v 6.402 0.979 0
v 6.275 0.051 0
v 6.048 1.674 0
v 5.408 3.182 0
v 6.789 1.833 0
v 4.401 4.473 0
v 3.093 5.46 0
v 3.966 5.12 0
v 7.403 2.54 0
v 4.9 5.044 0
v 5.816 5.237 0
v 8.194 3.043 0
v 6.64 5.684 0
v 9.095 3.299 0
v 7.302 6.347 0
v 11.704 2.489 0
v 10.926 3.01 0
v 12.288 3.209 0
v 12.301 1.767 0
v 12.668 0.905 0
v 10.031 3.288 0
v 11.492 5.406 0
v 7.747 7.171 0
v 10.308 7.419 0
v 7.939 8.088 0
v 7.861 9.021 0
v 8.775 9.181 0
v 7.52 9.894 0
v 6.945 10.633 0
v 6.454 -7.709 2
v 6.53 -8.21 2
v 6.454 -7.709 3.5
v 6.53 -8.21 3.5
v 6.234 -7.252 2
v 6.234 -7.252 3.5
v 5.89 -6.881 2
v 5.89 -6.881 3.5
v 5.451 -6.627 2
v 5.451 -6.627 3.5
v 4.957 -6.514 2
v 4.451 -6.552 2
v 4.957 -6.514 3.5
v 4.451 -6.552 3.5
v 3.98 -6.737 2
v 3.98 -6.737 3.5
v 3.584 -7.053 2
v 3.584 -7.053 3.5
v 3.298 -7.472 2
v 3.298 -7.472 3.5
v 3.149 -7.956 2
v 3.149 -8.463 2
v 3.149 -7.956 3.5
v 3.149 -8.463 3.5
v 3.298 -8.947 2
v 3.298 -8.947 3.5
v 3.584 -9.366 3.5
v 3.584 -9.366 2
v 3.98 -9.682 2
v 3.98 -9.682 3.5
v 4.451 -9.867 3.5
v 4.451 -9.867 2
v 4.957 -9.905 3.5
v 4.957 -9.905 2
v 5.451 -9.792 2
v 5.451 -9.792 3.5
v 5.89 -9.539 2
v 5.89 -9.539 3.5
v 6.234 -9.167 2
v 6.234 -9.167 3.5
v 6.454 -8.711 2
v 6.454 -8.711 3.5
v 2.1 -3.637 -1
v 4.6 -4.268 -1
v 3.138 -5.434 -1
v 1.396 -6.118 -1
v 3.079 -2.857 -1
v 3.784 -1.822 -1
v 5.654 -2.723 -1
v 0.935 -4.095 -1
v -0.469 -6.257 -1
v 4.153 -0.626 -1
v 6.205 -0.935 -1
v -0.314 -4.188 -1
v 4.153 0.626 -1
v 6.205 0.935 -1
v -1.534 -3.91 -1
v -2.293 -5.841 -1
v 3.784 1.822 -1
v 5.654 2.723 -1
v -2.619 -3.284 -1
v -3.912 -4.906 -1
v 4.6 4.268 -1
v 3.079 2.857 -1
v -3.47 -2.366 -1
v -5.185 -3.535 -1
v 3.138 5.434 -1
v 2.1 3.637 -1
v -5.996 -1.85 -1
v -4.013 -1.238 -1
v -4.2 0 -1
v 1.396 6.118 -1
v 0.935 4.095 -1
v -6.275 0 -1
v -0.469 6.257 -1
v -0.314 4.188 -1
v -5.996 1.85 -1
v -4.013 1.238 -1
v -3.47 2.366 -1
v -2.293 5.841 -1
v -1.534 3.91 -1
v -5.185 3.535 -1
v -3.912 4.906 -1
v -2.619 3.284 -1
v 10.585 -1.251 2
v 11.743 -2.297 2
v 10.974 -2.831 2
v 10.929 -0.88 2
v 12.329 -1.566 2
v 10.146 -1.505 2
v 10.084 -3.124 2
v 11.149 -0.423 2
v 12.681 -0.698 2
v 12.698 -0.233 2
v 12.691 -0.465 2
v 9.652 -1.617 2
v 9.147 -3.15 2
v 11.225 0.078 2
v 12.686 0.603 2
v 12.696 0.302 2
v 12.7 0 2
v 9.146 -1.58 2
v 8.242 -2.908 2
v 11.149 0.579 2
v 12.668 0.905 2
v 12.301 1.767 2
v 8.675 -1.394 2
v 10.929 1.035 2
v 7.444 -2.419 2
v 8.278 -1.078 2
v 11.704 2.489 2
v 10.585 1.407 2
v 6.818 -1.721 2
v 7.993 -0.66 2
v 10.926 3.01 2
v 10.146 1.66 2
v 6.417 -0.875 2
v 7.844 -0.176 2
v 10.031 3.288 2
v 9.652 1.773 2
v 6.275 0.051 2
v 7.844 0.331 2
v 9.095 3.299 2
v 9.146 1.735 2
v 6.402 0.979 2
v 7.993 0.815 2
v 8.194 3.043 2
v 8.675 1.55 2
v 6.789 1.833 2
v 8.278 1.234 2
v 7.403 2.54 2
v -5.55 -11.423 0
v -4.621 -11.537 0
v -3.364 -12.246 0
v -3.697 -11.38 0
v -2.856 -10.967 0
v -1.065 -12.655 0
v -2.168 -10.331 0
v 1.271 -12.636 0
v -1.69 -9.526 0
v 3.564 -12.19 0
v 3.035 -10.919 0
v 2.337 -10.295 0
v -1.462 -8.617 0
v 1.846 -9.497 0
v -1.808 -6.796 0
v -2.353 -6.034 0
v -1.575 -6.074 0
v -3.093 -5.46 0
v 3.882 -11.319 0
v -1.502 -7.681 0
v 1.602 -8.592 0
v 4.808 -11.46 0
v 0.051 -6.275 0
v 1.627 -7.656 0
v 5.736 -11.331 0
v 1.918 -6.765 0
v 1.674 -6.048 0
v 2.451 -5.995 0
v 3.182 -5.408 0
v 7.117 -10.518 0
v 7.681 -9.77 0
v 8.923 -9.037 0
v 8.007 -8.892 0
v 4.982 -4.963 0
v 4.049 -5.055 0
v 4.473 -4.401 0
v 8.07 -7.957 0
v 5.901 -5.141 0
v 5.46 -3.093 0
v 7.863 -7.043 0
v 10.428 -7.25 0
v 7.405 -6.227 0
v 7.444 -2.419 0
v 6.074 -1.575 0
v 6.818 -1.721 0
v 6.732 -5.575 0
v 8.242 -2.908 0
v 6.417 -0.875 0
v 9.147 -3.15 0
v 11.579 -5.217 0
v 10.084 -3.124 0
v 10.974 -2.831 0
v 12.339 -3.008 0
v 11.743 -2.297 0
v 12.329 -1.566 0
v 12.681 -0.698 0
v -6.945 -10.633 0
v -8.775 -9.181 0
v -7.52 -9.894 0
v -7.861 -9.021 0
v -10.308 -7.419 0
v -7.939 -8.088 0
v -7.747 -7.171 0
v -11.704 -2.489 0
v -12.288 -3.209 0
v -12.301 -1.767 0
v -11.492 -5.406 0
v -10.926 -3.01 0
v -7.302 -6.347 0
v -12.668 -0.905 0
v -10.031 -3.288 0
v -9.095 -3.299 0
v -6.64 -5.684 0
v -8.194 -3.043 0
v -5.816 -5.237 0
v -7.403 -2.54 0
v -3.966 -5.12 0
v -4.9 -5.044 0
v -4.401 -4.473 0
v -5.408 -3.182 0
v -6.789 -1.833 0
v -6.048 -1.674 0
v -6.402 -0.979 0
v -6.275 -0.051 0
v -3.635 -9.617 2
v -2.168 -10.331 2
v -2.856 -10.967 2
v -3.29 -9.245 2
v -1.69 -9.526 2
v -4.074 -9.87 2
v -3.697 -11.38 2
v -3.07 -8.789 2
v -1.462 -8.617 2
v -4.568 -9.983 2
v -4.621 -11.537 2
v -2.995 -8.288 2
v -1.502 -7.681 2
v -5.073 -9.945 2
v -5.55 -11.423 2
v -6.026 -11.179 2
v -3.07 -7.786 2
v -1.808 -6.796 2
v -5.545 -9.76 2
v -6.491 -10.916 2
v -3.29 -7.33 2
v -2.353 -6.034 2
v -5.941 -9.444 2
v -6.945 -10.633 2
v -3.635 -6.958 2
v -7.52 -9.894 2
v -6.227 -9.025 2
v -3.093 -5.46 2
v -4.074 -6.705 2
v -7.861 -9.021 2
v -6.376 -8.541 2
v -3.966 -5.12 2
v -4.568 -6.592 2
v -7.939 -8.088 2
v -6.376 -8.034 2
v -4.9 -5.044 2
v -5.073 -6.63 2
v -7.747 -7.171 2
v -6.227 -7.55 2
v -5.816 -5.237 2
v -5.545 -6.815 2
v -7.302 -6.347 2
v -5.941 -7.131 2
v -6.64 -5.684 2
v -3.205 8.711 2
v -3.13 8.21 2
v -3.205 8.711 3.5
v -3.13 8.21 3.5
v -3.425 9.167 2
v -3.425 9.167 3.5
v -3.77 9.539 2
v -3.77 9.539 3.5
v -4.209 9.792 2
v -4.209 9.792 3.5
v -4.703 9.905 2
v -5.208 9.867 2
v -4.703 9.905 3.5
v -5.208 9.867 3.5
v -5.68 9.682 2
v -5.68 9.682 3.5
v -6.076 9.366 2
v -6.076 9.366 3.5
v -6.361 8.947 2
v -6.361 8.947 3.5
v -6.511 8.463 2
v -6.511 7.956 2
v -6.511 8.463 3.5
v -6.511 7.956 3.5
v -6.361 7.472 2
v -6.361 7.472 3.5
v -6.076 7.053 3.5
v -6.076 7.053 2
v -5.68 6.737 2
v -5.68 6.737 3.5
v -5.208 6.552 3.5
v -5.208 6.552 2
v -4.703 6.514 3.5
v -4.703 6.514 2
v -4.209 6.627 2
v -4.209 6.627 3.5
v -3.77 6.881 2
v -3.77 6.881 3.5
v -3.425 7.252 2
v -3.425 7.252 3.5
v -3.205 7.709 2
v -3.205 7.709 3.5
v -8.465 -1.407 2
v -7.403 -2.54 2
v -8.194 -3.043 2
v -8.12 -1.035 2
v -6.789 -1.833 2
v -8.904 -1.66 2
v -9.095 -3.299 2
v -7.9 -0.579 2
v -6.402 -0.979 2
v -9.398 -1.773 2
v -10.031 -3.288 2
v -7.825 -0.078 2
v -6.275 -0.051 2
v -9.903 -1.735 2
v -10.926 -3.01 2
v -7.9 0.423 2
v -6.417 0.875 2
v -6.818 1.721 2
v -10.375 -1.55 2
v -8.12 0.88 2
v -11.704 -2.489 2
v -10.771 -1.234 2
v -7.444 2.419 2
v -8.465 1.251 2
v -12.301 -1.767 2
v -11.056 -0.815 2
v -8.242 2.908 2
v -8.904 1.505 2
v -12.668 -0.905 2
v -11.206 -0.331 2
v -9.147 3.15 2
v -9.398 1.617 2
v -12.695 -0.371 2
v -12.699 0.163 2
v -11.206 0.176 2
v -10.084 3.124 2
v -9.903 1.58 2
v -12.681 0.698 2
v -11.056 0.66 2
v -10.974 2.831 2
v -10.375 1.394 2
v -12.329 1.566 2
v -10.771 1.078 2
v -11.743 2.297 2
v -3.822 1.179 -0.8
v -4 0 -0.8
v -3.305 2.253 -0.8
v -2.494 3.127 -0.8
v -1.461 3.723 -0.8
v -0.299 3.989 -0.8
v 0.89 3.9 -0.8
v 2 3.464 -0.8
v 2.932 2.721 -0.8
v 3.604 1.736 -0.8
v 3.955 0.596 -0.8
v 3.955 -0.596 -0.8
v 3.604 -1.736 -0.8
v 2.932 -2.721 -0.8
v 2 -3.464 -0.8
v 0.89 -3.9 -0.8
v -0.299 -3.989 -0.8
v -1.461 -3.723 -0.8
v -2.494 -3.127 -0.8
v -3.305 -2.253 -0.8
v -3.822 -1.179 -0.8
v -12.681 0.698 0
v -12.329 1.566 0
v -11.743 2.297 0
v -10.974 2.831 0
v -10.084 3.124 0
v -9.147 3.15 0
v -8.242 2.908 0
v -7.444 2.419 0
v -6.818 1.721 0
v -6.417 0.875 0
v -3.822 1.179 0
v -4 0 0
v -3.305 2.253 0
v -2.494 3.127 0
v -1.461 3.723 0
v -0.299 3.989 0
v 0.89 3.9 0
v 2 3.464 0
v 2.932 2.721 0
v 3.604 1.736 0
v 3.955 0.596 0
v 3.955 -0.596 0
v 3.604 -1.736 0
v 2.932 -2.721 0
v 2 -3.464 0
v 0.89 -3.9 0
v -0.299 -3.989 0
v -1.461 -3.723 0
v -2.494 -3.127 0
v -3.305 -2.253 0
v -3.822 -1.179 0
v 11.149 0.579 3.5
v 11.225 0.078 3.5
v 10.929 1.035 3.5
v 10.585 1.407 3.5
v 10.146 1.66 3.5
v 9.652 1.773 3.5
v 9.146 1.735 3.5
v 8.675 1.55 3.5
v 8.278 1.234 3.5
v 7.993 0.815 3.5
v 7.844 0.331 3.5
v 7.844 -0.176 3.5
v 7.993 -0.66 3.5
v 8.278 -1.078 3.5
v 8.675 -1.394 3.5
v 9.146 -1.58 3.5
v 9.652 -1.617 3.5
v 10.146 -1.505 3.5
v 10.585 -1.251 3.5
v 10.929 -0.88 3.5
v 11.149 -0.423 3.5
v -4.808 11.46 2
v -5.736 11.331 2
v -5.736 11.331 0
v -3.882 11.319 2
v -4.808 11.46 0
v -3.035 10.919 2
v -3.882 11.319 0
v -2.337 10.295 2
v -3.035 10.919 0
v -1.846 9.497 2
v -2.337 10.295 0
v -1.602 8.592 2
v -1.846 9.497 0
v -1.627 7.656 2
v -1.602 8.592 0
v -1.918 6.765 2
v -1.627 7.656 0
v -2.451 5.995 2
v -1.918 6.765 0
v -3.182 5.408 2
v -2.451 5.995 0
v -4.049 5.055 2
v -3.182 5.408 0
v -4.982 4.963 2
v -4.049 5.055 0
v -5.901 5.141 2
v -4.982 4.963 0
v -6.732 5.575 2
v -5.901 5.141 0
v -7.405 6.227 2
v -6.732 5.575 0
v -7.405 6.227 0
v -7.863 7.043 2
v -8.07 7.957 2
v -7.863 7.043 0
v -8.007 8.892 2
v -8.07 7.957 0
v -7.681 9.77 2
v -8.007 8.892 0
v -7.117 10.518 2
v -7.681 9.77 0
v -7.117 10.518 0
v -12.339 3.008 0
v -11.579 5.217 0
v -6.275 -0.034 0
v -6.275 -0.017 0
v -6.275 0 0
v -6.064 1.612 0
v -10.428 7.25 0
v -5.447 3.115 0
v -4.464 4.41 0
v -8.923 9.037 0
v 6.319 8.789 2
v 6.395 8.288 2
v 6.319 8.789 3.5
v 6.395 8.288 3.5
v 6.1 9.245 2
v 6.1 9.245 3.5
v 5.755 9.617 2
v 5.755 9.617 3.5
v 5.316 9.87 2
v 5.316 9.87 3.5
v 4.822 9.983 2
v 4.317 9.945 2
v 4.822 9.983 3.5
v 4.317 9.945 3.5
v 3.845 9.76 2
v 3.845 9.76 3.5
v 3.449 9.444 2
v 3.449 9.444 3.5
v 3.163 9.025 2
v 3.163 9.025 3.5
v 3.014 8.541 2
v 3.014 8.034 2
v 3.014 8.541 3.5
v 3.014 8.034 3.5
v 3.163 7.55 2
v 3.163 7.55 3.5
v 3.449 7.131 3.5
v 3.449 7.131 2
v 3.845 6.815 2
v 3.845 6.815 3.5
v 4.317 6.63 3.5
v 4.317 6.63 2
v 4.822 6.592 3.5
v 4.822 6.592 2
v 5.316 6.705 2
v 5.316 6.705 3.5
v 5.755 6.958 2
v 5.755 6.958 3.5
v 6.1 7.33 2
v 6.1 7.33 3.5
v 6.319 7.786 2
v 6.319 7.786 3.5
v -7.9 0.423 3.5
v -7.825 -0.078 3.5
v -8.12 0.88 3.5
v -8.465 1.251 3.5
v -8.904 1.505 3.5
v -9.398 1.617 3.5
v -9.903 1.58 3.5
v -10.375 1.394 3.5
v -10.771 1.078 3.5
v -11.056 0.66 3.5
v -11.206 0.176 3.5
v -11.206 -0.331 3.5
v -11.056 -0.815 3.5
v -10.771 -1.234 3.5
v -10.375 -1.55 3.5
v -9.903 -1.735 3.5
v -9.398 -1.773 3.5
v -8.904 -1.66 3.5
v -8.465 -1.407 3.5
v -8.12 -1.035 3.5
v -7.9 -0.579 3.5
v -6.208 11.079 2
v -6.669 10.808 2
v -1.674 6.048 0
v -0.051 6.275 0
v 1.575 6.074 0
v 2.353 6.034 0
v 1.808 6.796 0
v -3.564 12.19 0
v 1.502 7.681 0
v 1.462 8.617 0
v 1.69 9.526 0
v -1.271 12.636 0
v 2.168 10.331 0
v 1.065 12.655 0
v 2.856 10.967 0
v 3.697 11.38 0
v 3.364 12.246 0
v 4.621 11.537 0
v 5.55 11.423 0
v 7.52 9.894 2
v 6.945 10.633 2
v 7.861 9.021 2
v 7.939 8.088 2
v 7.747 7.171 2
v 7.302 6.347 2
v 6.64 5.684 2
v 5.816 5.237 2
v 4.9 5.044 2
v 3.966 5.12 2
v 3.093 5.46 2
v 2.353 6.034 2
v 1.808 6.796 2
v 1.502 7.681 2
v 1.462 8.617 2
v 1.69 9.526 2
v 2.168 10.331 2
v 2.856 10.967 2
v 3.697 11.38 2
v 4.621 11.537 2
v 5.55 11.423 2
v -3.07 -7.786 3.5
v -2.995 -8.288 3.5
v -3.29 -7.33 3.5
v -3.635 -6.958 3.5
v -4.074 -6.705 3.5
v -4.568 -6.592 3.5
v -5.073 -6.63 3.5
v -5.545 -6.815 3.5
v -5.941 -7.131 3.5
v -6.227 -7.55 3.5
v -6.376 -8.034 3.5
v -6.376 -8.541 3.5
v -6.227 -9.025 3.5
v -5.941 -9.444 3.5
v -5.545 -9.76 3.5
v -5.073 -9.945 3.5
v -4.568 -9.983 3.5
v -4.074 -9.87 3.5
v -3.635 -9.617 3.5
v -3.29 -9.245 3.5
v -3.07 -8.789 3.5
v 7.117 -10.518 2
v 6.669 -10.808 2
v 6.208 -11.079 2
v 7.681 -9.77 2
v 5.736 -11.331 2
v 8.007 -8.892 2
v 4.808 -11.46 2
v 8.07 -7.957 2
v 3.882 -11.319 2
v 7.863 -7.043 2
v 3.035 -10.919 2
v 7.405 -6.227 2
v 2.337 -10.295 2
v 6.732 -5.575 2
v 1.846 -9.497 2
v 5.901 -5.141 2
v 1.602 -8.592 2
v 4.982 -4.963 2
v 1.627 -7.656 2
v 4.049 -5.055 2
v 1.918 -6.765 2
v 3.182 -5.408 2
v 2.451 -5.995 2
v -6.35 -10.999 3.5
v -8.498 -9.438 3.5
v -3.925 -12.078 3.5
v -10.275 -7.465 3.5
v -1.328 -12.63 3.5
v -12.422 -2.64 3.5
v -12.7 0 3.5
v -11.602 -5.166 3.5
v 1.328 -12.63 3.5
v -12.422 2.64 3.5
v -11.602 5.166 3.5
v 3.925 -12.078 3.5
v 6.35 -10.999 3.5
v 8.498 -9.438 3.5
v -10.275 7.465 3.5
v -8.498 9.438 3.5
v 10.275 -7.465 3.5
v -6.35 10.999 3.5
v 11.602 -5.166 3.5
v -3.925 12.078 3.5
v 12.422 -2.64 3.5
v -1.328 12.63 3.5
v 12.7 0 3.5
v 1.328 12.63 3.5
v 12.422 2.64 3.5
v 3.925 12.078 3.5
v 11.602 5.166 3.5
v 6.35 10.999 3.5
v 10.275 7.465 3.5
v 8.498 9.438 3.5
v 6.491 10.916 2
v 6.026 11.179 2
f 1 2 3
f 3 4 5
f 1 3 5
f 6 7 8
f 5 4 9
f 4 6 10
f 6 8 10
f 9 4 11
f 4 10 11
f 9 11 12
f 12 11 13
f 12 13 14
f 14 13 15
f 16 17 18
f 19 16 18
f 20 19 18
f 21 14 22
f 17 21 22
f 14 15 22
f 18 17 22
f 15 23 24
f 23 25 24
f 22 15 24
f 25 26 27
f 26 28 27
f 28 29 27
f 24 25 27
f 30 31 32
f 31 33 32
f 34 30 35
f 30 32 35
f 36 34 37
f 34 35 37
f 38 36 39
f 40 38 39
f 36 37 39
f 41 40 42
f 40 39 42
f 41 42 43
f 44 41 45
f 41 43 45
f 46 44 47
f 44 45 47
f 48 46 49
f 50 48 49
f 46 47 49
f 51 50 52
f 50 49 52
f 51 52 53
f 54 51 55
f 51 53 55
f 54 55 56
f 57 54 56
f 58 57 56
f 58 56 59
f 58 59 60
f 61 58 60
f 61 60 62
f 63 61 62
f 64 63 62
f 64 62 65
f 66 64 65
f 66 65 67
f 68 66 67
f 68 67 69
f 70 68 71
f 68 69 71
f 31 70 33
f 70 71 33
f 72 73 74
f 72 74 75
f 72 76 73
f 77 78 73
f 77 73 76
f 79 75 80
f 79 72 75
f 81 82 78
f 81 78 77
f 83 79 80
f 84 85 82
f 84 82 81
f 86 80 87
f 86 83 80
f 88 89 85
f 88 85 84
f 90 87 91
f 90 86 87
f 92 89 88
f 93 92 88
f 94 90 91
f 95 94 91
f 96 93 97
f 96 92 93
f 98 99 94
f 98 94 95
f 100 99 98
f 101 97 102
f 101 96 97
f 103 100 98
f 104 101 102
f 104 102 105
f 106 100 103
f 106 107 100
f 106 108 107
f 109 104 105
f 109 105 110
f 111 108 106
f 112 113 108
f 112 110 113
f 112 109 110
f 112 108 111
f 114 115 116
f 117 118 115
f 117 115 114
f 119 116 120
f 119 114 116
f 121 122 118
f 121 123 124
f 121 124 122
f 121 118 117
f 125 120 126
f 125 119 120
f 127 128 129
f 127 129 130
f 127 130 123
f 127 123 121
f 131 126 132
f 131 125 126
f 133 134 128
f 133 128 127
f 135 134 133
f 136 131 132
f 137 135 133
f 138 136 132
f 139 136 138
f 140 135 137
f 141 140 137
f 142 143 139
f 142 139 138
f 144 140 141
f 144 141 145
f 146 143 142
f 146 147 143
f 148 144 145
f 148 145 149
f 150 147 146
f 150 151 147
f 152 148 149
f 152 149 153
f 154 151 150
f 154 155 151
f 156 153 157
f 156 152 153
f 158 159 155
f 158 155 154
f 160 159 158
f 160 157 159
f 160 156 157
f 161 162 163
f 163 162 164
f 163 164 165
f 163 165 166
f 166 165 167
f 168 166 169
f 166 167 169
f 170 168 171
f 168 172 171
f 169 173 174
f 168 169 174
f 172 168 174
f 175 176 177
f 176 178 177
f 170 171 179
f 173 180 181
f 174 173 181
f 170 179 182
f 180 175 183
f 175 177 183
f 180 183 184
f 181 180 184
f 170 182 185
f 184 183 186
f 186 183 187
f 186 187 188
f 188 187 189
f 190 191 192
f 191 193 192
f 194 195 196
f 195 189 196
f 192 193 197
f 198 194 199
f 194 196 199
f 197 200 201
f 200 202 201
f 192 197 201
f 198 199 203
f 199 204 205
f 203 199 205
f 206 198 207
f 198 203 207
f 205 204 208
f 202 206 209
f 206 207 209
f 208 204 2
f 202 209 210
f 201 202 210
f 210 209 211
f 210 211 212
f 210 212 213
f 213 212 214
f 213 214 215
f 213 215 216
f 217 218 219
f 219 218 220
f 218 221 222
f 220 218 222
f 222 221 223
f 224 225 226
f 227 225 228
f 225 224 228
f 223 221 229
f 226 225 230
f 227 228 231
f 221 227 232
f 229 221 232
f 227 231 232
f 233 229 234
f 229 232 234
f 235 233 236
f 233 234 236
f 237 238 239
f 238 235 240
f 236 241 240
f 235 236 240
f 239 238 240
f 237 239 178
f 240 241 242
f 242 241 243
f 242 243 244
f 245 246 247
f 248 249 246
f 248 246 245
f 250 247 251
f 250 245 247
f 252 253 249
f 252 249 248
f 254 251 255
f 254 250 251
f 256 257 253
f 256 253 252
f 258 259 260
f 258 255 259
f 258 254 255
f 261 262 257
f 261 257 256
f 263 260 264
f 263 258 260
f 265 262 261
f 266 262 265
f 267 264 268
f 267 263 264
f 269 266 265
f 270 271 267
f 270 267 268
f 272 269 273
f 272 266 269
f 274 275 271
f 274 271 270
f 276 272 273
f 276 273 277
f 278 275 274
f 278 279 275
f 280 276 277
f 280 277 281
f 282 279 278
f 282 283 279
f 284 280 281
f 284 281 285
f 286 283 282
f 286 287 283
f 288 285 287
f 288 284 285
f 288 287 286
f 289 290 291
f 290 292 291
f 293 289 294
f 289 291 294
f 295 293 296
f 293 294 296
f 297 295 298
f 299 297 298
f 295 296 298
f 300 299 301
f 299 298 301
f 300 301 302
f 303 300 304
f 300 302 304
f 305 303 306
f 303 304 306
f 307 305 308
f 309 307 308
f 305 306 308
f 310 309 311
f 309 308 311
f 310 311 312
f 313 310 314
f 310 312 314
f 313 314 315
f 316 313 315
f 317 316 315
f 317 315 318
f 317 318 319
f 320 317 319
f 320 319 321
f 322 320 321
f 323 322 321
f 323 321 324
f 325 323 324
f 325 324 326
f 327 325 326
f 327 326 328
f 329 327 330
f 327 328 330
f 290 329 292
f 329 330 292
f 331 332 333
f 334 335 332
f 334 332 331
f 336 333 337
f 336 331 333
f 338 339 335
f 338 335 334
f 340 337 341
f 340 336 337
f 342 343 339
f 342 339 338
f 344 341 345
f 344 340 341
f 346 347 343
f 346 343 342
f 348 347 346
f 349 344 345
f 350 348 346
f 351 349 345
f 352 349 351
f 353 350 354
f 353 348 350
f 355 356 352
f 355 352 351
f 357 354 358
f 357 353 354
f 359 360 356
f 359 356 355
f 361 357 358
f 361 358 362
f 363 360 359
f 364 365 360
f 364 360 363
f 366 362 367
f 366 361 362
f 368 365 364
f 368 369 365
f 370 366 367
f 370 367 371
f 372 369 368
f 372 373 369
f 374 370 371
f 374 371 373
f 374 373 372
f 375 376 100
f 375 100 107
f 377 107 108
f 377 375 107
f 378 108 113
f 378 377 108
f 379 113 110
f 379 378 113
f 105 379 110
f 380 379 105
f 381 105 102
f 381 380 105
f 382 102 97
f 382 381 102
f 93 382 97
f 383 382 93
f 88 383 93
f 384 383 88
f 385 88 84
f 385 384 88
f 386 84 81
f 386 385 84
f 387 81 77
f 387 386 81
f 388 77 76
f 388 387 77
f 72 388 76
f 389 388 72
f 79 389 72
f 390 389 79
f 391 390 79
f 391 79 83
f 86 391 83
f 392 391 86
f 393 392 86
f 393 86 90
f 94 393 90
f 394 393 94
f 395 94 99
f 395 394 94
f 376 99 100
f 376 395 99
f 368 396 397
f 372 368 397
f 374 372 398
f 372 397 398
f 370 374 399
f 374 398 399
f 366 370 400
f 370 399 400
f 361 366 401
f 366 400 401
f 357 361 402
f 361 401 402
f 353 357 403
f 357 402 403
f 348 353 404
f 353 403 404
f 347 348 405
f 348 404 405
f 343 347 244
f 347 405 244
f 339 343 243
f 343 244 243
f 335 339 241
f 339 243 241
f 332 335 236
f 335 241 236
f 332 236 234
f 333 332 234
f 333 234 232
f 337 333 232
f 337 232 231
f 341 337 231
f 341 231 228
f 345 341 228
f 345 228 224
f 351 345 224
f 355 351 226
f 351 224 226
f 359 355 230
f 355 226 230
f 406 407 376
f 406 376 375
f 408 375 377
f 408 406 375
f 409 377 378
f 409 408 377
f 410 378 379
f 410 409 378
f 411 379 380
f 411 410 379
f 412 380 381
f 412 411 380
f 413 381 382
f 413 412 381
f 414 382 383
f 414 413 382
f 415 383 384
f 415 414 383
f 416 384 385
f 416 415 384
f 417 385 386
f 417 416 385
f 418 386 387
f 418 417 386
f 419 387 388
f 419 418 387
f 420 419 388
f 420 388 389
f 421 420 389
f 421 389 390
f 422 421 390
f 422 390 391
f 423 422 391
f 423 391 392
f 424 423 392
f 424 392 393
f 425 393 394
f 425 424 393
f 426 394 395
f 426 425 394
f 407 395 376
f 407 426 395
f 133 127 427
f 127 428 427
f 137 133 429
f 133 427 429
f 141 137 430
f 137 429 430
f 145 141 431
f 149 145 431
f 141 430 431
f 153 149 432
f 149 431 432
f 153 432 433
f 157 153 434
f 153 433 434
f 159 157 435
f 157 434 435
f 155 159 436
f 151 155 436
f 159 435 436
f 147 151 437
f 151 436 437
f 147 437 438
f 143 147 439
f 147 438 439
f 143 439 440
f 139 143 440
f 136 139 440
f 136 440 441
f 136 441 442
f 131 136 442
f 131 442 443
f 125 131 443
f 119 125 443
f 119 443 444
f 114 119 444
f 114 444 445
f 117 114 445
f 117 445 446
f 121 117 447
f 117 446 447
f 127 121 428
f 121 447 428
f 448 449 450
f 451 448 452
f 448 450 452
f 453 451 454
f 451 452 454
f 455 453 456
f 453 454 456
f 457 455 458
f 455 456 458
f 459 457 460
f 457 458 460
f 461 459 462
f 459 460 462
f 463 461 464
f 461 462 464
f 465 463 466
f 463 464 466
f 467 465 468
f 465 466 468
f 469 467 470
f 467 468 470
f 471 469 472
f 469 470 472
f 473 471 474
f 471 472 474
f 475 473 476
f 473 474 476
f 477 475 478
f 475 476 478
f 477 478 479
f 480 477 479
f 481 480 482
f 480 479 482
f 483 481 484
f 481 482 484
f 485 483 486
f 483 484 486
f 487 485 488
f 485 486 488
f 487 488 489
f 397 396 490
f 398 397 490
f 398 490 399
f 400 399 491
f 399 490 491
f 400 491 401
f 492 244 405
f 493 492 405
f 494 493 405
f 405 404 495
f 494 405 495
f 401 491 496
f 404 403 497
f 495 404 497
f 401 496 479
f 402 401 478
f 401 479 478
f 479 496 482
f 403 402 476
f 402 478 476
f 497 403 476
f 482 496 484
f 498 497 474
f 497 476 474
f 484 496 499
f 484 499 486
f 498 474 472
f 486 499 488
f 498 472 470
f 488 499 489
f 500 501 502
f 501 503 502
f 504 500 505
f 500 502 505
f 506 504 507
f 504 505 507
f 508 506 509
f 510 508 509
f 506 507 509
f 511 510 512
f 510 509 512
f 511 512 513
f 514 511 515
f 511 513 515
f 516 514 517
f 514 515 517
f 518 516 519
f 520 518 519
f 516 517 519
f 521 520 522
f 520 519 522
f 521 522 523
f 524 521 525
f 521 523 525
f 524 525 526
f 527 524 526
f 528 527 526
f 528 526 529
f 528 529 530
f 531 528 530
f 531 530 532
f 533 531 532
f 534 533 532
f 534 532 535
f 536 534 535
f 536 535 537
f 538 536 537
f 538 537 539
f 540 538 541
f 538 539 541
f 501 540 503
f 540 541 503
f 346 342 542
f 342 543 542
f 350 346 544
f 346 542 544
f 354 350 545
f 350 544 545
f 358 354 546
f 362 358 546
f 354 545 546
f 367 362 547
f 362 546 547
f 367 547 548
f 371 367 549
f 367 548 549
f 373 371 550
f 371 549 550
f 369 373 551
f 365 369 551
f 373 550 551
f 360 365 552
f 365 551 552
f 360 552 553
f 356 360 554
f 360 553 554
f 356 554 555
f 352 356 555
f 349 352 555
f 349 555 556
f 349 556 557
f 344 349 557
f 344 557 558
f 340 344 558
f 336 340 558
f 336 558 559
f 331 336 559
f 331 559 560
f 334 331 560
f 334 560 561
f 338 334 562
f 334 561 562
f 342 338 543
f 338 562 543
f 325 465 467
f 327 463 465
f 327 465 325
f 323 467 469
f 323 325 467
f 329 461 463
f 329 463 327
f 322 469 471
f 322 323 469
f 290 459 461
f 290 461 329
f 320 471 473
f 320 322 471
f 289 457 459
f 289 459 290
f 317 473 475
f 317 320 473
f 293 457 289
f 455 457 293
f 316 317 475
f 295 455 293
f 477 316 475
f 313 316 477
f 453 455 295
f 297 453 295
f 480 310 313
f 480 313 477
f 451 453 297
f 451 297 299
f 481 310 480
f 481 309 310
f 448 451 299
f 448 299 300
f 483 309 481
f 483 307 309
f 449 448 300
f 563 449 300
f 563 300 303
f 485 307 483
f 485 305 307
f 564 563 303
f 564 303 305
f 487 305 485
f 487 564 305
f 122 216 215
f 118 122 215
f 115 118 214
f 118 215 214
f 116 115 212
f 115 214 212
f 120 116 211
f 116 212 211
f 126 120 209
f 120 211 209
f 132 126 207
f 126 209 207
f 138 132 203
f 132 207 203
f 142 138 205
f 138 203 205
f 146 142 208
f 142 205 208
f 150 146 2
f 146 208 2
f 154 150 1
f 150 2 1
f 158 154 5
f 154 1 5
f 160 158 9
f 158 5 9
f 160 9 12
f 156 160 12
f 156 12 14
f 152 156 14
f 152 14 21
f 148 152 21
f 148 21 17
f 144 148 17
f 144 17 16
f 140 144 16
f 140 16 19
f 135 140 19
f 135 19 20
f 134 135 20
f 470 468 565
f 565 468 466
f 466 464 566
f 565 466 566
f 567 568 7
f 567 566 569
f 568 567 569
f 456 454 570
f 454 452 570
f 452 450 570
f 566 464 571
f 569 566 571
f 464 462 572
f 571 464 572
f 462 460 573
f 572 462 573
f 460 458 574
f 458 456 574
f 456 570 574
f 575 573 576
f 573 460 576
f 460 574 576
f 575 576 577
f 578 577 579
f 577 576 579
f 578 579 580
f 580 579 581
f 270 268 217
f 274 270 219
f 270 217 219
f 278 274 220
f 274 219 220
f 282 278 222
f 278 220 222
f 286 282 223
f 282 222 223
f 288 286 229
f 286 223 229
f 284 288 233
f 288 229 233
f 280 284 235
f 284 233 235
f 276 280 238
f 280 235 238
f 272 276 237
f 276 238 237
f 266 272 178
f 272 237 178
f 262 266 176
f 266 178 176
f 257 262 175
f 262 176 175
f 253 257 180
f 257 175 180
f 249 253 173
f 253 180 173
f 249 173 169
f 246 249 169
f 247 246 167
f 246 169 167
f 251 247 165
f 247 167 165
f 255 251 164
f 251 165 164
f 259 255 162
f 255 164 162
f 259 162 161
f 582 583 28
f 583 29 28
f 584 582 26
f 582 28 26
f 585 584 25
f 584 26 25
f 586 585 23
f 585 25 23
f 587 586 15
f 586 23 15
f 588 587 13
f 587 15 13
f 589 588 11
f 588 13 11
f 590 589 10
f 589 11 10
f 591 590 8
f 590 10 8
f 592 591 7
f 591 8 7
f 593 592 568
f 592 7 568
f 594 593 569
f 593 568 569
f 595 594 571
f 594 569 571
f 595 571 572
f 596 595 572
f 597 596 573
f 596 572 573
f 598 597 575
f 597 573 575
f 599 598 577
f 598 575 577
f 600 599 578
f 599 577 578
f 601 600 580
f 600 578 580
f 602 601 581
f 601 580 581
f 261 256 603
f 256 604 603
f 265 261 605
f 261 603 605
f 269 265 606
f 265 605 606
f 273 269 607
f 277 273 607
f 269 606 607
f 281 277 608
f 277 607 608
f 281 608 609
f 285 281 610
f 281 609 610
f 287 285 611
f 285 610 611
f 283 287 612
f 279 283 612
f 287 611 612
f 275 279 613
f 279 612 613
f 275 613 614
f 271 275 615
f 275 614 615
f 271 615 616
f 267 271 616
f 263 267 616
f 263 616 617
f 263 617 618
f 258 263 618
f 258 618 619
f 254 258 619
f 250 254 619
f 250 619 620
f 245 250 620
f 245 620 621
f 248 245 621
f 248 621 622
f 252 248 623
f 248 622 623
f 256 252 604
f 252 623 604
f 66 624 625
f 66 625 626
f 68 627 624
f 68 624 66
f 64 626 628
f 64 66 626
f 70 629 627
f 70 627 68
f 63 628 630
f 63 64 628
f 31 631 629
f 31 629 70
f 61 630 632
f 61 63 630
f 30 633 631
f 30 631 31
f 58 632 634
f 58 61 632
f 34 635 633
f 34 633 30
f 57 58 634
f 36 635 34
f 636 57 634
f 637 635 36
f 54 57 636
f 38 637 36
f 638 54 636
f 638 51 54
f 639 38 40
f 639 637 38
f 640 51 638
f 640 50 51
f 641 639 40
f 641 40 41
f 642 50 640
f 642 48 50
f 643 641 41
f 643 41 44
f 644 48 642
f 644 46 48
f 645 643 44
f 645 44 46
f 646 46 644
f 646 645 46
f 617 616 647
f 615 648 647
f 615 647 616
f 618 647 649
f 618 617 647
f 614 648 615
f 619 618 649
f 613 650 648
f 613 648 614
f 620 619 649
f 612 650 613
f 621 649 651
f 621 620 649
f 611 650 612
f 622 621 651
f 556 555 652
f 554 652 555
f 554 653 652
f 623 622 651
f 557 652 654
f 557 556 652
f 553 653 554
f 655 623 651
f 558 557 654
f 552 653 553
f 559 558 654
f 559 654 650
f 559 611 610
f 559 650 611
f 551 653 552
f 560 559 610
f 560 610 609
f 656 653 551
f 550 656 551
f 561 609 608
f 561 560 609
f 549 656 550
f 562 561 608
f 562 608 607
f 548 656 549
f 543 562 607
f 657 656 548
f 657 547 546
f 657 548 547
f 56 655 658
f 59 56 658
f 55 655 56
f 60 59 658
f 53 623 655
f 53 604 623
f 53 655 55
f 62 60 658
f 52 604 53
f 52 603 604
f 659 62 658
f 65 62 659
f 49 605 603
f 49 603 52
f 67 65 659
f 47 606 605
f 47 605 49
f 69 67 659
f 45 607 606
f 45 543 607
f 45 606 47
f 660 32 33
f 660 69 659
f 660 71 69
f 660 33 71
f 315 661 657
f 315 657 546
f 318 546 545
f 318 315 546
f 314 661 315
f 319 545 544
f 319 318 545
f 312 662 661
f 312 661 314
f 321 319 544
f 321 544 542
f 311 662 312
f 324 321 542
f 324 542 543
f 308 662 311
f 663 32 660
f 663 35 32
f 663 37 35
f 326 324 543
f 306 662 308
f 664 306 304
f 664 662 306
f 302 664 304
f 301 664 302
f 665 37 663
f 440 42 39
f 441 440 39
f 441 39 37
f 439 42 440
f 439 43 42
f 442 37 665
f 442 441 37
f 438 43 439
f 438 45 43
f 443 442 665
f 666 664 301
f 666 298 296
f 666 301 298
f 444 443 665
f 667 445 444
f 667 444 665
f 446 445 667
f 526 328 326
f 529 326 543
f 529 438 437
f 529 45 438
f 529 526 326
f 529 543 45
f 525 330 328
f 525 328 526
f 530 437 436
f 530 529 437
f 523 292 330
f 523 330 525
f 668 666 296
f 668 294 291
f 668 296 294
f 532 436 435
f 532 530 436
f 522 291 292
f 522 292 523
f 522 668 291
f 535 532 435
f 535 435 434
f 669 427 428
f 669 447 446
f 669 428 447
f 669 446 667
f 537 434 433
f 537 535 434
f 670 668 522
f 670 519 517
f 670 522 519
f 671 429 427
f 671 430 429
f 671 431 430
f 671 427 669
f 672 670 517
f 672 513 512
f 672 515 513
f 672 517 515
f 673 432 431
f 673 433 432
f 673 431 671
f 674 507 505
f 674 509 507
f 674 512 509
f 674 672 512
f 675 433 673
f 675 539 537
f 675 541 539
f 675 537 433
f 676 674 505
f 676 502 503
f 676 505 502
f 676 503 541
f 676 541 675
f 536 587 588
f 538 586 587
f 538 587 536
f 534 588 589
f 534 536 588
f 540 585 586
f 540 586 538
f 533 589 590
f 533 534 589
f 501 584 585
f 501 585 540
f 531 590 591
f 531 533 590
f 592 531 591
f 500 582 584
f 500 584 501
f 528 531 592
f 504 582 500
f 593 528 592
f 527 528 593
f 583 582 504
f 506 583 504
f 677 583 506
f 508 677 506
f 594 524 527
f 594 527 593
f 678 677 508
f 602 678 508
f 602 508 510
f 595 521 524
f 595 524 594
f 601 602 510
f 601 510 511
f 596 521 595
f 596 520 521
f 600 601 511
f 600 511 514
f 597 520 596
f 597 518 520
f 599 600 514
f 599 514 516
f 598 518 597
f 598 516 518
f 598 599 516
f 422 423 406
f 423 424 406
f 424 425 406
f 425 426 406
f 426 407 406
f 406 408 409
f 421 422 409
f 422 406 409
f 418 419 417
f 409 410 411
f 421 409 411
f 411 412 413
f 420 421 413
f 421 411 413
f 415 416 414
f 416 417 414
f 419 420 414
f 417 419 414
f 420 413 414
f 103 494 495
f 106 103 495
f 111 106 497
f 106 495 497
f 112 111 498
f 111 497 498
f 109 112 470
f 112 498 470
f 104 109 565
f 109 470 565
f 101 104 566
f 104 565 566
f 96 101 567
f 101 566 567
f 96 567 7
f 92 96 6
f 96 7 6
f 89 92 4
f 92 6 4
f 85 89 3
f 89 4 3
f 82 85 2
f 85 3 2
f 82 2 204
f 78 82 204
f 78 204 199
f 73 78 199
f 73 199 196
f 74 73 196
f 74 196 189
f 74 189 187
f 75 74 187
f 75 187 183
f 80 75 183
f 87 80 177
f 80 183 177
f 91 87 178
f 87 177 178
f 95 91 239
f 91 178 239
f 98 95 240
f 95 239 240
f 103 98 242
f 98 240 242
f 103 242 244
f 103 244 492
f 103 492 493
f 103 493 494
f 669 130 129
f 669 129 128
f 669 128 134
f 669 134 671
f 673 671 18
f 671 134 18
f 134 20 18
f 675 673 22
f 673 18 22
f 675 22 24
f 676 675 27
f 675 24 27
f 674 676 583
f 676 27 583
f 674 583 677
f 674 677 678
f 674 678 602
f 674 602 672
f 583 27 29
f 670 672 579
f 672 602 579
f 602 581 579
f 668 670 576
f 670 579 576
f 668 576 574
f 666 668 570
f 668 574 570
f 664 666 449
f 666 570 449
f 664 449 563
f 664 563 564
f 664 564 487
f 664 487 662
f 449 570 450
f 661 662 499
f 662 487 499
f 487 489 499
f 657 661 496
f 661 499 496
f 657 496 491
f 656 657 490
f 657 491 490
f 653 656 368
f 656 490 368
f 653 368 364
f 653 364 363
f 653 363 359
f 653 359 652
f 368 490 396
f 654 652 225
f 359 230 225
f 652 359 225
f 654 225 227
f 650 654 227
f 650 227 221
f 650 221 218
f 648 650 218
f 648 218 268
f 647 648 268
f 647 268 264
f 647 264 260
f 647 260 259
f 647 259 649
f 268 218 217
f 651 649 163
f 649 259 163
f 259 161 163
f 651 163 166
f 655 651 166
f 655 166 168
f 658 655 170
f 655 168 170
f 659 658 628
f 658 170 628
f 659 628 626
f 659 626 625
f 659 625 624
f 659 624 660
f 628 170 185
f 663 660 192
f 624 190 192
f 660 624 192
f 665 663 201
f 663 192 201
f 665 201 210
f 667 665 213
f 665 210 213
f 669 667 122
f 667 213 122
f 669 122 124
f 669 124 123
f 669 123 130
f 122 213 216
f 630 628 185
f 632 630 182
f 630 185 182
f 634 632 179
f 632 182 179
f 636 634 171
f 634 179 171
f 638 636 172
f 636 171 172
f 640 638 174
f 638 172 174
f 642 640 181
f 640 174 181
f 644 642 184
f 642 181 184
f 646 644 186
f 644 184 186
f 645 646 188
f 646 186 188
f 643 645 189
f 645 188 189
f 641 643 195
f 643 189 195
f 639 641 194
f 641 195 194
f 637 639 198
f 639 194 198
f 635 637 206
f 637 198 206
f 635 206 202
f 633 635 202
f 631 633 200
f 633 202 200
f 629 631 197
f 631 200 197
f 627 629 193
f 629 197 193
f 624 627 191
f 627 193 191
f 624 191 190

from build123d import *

# Parameters (mm, degrees)
SKETCH1_R                                   = 12.7
BOSS_EXTRUDE1_DEPTH                         = 3.5
CBORE_FOR_M3_CHEESE_HEAD_SCREW1_D           = 3.4
CBORE_FOR_M3_CHEESE_HEAD_SCREW1_CBORE_D     = 6.5
CBORE_FOR_M3_CHEESE_HEAD_SCREW1_CBORE_DEPTH = 2
SKETCH7_R                                   = 6.275
SKETCH7_R_2                                 = 4
BOSS_EXTRUDE2_DEPTH                         = 1
CHAMFER1_SIZE                               = 0.2


with BuildPart() as part:
    # Sketch1 → Boss-Extrude1 (new body)
    with BuildSketch(Plane.XY):
        Circle(SKETCH1_R)
    extrude(amount=BOSS_EXTRUDE1_DEPTH)

    # CBORE for M3 Cheese Head Screw1 (through all)
    with Locations(Plane(origin=(0, 0, 0), x_dir=(-1, 0, 0), z_dir=(0, 0, -1))):
        with Locations((4.694946795, -8.287526748), (-4.8297353, -8.209706568), (-9.524682095, 0.07782018), (-4.694946795, 8.287526748), (4.8297353, 8.209706568), (9.524682095, -0.07782018)):
            CounterBoreHole(CBORE_FOR_M3_CHEESE_HEAD_SCREW1_D / 2, CBORE_FOR_M3_CHEESE_HEAD_SCREW1_CBORE_D / 2, CBORE_FOR_M3_CHEESE_HEAD_SCREW1_CBORE_DEPTH)

    # Sketch7 → Boss-Extrude2 (add)
    with BuildSketch(Plane(origin=(0, 0, 0), x_dir=(-1, 0, 0), z_dir=(0, 0, -1))):
        Circle(SKETCH7_R)
        Circle(SKETCH7_R_2, mode=Mode.SUBTRACT)
    extrude(amount=BOSS_EXTRUDE2_DEPTH)

    # Chamfer1
    chamfer1_edges = [part.edges().sort_by_distance(p)[0] for p in [
        (4, 0, -1),
    ]]
    chamfer(chamfer1_edges, length=CHAMFER1_SIZE)


solid = part.part
